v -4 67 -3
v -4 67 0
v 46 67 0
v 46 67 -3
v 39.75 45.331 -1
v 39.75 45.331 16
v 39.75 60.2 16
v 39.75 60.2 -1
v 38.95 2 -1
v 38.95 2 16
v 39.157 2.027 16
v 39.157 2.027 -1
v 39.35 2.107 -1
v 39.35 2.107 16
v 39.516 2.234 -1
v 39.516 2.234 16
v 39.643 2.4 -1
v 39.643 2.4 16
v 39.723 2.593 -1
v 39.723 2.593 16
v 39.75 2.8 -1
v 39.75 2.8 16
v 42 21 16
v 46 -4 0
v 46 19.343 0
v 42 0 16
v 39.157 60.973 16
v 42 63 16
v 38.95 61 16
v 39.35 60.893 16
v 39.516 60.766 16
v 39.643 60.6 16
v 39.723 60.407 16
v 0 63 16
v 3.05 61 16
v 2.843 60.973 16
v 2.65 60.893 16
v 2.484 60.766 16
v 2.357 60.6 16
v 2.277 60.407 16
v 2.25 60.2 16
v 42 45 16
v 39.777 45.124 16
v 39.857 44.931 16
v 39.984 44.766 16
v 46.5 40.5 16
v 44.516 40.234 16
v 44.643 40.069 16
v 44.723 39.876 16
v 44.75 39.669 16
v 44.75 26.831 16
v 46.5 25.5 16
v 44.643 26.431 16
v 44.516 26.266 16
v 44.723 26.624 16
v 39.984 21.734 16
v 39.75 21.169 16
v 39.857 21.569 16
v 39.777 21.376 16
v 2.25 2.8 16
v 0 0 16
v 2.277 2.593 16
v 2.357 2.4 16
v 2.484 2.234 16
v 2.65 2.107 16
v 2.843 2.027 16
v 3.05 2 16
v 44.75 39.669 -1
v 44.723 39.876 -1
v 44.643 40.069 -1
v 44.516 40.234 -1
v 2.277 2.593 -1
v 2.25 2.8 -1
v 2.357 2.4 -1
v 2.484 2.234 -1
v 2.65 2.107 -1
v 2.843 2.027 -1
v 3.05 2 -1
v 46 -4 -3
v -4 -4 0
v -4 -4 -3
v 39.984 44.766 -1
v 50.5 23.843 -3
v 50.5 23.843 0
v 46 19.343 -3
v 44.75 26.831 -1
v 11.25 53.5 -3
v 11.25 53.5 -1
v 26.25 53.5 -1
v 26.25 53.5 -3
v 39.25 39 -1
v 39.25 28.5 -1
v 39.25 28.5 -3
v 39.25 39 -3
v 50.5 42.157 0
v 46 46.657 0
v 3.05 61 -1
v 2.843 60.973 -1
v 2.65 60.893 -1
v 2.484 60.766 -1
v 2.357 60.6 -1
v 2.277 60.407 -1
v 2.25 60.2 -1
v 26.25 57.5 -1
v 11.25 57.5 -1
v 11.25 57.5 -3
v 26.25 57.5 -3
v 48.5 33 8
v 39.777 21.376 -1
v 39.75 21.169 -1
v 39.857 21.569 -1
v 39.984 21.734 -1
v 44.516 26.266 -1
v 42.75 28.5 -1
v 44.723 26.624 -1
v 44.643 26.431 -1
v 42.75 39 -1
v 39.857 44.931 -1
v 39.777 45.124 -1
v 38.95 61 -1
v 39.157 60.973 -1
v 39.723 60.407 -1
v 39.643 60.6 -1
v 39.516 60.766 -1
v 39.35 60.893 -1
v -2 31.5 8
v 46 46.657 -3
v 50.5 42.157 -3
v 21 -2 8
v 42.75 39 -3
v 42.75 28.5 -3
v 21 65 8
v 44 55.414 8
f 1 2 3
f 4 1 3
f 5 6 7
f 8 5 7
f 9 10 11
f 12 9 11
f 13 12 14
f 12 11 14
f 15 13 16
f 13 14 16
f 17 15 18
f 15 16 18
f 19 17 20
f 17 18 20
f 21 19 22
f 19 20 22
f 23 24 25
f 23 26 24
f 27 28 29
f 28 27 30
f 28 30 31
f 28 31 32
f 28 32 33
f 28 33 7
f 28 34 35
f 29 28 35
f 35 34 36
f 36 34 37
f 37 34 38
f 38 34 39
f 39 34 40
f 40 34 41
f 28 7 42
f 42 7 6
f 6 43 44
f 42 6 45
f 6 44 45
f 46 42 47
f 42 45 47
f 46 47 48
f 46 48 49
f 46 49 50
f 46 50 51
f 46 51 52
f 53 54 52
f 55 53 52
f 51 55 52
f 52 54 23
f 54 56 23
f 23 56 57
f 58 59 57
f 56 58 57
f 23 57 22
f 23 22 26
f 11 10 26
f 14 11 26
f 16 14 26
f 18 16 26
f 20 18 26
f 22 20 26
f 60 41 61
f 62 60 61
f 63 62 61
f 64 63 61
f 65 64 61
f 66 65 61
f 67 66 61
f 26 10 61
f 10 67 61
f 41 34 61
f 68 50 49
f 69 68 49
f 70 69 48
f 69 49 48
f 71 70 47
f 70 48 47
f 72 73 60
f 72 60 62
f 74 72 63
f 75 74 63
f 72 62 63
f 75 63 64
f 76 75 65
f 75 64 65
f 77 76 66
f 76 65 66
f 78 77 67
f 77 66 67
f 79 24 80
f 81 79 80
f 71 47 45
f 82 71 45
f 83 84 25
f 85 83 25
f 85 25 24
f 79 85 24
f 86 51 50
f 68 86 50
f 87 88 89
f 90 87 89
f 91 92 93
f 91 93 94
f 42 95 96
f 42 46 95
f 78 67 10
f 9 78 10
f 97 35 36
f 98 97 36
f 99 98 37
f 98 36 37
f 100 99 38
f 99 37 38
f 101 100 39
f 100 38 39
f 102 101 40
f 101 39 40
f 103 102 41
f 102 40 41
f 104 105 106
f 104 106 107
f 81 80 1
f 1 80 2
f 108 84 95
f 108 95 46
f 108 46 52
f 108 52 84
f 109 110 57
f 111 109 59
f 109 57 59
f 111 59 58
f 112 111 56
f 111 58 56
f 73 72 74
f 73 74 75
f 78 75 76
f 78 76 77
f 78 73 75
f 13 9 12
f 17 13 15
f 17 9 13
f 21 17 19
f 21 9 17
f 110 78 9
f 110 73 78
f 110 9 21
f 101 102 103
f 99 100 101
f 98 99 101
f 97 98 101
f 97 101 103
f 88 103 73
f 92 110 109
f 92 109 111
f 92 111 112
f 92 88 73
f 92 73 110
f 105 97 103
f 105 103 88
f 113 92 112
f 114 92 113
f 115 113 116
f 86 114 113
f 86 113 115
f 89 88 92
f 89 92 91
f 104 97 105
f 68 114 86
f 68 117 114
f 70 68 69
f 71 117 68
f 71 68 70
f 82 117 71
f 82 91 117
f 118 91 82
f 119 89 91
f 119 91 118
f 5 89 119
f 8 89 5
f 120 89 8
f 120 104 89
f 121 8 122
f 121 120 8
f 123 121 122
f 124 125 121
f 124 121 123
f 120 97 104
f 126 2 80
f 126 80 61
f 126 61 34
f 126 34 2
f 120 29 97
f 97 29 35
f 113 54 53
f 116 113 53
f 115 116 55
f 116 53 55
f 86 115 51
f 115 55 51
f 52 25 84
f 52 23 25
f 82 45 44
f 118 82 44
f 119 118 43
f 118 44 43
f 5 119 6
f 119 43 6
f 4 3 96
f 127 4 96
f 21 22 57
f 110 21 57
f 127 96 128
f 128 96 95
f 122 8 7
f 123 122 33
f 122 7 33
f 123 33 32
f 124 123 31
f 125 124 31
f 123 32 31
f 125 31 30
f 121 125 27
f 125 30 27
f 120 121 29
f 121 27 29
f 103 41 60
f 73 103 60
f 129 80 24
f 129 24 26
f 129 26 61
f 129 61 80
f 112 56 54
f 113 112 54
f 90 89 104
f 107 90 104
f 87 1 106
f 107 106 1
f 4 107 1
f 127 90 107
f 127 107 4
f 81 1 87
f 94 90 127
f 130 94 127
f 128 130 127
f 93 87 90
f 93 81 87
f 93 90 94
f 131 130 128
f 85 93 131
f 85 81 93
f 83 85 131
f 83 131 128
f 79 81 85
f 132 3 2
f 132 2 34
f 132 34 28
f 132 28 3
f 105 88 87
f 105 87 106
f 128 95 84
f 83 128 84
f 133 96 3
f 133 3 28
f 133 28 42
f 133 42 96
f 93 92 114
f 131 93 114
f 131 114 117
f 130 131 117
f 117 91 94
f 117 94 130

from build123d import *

# Parameters (mm, degrees)
F5_DEPTH = 3
F7_DEPTH = 17
F8_W     = 15
F8_H     = 4
F8_W_2   = 3.5
F8_H_2   = 10.5
F9_DEPTH = 2.001


with BuildPart() as f3:
    # F0 (on Top) → F3 section 0
    with BuildSketch(Plane.XY):
        Polygon((-4, 67), (-4, -4), (46, -4), (46, 19.3431457505), (50.5, 23.8431457505), (50.5, 42.1568542495), (46, 46.6568542495), (46, 67), align=None)
    # F2 (on offset) → F3 section 1
    with BuildSketch(Plane.XY.offset(16)):
        Polygon((0, 63), (0, 0), (42, 0), (42, 21), (46.5, 25.5), (46.5, 40.5), (42, 45), (42, 63), align=None)
    loft()

    # F4 (on face) → F5 (join)
    with BuildSketch(Plane(origin=(0, 0, 0), x_dir=(1, 0, 0), z_dir=(0, 0, -1))):
        Polygon((46, 4), (-4, 4), (-4, -67), (46, -67), (46, -46.6568542495), (50.5, -42.1568542495), (50.5, -23.8431457505), (46, -19.3431457505), align=None)
    extrude(amount=F5_DEPTH)

    # F6 (on face) → F7 (cut)
    with BuildSketch(Plane.XY.offset(16)):
        with BuildLine():
            Line((38.95, 61), (3.05, 61))
            ThreePointArc((3.05, 61), (2.4843145751, 60.7656854249), (2.25, 60.2))
            Line((2.25, 60.2), (2.25, 2.8))
            ThreePointArc((2.25, 2.8), (2.4843145751, 2.2343145751), (3.05, 2))
            Line((3.05, 2), (38.95, 2))
            ThreePointArc((38.95, 2), (39.5156854249, 2.2343145751), (39.75, 2.8))
            Line((39.75, 2.8), (39.75, 21.1686291501))
            ThreePointArc((39.75, 21.1686291501), (39.810896374, 21.474775896), (39.9843145751, 21.7343145751))
            Line((39.9843145751, 21.7343145751), (44.5156854249, 26.2656854249))
            ThreePointArc((44.5156854249, 26.2656854249), (44.689103626, 26.525224104), (44.75, 26.8313708499))
            Line((44.75, 26.8313708499), (44.75, 39.6686291501))
            ThreePointArc((44.75, 39.6686291501), (44.689103626, 39.974775896), (44.5156854249, 40.2343145751))
            Line((44.5156854249, 40.2343145751), (39.9843145751, 44.7656854249))
            ThreePointArc((39.9843145751, 44.7656854249), (39.810896374, 45.025224104), (39.75, 45.3313708499))
            Line((39.75, 45.3313708499), (39.75, 60.2))
            ThreePointArc((39.75, 60.2), (39.5156854249, 60.7656854249), (38.95, 61))
        make_face()
    extrude(amount=-F7_DEPTH, mode=Mode.SUBTRACT)

    # F8 (on face) → F9 (cut, through all)
    with BuildSketch(Plane.XY.offset(-1)):
        with Locations((18.75, 55.5)):
            Rectangle(F8_W, F8_H)
        with Locations((41, 33.75)):
            Rectangle(F8_W_2, F8_H_2)
    extrude(amount=-F9_DEPTH, mode=Mode.SUBTRACT)


solid = f3.part
